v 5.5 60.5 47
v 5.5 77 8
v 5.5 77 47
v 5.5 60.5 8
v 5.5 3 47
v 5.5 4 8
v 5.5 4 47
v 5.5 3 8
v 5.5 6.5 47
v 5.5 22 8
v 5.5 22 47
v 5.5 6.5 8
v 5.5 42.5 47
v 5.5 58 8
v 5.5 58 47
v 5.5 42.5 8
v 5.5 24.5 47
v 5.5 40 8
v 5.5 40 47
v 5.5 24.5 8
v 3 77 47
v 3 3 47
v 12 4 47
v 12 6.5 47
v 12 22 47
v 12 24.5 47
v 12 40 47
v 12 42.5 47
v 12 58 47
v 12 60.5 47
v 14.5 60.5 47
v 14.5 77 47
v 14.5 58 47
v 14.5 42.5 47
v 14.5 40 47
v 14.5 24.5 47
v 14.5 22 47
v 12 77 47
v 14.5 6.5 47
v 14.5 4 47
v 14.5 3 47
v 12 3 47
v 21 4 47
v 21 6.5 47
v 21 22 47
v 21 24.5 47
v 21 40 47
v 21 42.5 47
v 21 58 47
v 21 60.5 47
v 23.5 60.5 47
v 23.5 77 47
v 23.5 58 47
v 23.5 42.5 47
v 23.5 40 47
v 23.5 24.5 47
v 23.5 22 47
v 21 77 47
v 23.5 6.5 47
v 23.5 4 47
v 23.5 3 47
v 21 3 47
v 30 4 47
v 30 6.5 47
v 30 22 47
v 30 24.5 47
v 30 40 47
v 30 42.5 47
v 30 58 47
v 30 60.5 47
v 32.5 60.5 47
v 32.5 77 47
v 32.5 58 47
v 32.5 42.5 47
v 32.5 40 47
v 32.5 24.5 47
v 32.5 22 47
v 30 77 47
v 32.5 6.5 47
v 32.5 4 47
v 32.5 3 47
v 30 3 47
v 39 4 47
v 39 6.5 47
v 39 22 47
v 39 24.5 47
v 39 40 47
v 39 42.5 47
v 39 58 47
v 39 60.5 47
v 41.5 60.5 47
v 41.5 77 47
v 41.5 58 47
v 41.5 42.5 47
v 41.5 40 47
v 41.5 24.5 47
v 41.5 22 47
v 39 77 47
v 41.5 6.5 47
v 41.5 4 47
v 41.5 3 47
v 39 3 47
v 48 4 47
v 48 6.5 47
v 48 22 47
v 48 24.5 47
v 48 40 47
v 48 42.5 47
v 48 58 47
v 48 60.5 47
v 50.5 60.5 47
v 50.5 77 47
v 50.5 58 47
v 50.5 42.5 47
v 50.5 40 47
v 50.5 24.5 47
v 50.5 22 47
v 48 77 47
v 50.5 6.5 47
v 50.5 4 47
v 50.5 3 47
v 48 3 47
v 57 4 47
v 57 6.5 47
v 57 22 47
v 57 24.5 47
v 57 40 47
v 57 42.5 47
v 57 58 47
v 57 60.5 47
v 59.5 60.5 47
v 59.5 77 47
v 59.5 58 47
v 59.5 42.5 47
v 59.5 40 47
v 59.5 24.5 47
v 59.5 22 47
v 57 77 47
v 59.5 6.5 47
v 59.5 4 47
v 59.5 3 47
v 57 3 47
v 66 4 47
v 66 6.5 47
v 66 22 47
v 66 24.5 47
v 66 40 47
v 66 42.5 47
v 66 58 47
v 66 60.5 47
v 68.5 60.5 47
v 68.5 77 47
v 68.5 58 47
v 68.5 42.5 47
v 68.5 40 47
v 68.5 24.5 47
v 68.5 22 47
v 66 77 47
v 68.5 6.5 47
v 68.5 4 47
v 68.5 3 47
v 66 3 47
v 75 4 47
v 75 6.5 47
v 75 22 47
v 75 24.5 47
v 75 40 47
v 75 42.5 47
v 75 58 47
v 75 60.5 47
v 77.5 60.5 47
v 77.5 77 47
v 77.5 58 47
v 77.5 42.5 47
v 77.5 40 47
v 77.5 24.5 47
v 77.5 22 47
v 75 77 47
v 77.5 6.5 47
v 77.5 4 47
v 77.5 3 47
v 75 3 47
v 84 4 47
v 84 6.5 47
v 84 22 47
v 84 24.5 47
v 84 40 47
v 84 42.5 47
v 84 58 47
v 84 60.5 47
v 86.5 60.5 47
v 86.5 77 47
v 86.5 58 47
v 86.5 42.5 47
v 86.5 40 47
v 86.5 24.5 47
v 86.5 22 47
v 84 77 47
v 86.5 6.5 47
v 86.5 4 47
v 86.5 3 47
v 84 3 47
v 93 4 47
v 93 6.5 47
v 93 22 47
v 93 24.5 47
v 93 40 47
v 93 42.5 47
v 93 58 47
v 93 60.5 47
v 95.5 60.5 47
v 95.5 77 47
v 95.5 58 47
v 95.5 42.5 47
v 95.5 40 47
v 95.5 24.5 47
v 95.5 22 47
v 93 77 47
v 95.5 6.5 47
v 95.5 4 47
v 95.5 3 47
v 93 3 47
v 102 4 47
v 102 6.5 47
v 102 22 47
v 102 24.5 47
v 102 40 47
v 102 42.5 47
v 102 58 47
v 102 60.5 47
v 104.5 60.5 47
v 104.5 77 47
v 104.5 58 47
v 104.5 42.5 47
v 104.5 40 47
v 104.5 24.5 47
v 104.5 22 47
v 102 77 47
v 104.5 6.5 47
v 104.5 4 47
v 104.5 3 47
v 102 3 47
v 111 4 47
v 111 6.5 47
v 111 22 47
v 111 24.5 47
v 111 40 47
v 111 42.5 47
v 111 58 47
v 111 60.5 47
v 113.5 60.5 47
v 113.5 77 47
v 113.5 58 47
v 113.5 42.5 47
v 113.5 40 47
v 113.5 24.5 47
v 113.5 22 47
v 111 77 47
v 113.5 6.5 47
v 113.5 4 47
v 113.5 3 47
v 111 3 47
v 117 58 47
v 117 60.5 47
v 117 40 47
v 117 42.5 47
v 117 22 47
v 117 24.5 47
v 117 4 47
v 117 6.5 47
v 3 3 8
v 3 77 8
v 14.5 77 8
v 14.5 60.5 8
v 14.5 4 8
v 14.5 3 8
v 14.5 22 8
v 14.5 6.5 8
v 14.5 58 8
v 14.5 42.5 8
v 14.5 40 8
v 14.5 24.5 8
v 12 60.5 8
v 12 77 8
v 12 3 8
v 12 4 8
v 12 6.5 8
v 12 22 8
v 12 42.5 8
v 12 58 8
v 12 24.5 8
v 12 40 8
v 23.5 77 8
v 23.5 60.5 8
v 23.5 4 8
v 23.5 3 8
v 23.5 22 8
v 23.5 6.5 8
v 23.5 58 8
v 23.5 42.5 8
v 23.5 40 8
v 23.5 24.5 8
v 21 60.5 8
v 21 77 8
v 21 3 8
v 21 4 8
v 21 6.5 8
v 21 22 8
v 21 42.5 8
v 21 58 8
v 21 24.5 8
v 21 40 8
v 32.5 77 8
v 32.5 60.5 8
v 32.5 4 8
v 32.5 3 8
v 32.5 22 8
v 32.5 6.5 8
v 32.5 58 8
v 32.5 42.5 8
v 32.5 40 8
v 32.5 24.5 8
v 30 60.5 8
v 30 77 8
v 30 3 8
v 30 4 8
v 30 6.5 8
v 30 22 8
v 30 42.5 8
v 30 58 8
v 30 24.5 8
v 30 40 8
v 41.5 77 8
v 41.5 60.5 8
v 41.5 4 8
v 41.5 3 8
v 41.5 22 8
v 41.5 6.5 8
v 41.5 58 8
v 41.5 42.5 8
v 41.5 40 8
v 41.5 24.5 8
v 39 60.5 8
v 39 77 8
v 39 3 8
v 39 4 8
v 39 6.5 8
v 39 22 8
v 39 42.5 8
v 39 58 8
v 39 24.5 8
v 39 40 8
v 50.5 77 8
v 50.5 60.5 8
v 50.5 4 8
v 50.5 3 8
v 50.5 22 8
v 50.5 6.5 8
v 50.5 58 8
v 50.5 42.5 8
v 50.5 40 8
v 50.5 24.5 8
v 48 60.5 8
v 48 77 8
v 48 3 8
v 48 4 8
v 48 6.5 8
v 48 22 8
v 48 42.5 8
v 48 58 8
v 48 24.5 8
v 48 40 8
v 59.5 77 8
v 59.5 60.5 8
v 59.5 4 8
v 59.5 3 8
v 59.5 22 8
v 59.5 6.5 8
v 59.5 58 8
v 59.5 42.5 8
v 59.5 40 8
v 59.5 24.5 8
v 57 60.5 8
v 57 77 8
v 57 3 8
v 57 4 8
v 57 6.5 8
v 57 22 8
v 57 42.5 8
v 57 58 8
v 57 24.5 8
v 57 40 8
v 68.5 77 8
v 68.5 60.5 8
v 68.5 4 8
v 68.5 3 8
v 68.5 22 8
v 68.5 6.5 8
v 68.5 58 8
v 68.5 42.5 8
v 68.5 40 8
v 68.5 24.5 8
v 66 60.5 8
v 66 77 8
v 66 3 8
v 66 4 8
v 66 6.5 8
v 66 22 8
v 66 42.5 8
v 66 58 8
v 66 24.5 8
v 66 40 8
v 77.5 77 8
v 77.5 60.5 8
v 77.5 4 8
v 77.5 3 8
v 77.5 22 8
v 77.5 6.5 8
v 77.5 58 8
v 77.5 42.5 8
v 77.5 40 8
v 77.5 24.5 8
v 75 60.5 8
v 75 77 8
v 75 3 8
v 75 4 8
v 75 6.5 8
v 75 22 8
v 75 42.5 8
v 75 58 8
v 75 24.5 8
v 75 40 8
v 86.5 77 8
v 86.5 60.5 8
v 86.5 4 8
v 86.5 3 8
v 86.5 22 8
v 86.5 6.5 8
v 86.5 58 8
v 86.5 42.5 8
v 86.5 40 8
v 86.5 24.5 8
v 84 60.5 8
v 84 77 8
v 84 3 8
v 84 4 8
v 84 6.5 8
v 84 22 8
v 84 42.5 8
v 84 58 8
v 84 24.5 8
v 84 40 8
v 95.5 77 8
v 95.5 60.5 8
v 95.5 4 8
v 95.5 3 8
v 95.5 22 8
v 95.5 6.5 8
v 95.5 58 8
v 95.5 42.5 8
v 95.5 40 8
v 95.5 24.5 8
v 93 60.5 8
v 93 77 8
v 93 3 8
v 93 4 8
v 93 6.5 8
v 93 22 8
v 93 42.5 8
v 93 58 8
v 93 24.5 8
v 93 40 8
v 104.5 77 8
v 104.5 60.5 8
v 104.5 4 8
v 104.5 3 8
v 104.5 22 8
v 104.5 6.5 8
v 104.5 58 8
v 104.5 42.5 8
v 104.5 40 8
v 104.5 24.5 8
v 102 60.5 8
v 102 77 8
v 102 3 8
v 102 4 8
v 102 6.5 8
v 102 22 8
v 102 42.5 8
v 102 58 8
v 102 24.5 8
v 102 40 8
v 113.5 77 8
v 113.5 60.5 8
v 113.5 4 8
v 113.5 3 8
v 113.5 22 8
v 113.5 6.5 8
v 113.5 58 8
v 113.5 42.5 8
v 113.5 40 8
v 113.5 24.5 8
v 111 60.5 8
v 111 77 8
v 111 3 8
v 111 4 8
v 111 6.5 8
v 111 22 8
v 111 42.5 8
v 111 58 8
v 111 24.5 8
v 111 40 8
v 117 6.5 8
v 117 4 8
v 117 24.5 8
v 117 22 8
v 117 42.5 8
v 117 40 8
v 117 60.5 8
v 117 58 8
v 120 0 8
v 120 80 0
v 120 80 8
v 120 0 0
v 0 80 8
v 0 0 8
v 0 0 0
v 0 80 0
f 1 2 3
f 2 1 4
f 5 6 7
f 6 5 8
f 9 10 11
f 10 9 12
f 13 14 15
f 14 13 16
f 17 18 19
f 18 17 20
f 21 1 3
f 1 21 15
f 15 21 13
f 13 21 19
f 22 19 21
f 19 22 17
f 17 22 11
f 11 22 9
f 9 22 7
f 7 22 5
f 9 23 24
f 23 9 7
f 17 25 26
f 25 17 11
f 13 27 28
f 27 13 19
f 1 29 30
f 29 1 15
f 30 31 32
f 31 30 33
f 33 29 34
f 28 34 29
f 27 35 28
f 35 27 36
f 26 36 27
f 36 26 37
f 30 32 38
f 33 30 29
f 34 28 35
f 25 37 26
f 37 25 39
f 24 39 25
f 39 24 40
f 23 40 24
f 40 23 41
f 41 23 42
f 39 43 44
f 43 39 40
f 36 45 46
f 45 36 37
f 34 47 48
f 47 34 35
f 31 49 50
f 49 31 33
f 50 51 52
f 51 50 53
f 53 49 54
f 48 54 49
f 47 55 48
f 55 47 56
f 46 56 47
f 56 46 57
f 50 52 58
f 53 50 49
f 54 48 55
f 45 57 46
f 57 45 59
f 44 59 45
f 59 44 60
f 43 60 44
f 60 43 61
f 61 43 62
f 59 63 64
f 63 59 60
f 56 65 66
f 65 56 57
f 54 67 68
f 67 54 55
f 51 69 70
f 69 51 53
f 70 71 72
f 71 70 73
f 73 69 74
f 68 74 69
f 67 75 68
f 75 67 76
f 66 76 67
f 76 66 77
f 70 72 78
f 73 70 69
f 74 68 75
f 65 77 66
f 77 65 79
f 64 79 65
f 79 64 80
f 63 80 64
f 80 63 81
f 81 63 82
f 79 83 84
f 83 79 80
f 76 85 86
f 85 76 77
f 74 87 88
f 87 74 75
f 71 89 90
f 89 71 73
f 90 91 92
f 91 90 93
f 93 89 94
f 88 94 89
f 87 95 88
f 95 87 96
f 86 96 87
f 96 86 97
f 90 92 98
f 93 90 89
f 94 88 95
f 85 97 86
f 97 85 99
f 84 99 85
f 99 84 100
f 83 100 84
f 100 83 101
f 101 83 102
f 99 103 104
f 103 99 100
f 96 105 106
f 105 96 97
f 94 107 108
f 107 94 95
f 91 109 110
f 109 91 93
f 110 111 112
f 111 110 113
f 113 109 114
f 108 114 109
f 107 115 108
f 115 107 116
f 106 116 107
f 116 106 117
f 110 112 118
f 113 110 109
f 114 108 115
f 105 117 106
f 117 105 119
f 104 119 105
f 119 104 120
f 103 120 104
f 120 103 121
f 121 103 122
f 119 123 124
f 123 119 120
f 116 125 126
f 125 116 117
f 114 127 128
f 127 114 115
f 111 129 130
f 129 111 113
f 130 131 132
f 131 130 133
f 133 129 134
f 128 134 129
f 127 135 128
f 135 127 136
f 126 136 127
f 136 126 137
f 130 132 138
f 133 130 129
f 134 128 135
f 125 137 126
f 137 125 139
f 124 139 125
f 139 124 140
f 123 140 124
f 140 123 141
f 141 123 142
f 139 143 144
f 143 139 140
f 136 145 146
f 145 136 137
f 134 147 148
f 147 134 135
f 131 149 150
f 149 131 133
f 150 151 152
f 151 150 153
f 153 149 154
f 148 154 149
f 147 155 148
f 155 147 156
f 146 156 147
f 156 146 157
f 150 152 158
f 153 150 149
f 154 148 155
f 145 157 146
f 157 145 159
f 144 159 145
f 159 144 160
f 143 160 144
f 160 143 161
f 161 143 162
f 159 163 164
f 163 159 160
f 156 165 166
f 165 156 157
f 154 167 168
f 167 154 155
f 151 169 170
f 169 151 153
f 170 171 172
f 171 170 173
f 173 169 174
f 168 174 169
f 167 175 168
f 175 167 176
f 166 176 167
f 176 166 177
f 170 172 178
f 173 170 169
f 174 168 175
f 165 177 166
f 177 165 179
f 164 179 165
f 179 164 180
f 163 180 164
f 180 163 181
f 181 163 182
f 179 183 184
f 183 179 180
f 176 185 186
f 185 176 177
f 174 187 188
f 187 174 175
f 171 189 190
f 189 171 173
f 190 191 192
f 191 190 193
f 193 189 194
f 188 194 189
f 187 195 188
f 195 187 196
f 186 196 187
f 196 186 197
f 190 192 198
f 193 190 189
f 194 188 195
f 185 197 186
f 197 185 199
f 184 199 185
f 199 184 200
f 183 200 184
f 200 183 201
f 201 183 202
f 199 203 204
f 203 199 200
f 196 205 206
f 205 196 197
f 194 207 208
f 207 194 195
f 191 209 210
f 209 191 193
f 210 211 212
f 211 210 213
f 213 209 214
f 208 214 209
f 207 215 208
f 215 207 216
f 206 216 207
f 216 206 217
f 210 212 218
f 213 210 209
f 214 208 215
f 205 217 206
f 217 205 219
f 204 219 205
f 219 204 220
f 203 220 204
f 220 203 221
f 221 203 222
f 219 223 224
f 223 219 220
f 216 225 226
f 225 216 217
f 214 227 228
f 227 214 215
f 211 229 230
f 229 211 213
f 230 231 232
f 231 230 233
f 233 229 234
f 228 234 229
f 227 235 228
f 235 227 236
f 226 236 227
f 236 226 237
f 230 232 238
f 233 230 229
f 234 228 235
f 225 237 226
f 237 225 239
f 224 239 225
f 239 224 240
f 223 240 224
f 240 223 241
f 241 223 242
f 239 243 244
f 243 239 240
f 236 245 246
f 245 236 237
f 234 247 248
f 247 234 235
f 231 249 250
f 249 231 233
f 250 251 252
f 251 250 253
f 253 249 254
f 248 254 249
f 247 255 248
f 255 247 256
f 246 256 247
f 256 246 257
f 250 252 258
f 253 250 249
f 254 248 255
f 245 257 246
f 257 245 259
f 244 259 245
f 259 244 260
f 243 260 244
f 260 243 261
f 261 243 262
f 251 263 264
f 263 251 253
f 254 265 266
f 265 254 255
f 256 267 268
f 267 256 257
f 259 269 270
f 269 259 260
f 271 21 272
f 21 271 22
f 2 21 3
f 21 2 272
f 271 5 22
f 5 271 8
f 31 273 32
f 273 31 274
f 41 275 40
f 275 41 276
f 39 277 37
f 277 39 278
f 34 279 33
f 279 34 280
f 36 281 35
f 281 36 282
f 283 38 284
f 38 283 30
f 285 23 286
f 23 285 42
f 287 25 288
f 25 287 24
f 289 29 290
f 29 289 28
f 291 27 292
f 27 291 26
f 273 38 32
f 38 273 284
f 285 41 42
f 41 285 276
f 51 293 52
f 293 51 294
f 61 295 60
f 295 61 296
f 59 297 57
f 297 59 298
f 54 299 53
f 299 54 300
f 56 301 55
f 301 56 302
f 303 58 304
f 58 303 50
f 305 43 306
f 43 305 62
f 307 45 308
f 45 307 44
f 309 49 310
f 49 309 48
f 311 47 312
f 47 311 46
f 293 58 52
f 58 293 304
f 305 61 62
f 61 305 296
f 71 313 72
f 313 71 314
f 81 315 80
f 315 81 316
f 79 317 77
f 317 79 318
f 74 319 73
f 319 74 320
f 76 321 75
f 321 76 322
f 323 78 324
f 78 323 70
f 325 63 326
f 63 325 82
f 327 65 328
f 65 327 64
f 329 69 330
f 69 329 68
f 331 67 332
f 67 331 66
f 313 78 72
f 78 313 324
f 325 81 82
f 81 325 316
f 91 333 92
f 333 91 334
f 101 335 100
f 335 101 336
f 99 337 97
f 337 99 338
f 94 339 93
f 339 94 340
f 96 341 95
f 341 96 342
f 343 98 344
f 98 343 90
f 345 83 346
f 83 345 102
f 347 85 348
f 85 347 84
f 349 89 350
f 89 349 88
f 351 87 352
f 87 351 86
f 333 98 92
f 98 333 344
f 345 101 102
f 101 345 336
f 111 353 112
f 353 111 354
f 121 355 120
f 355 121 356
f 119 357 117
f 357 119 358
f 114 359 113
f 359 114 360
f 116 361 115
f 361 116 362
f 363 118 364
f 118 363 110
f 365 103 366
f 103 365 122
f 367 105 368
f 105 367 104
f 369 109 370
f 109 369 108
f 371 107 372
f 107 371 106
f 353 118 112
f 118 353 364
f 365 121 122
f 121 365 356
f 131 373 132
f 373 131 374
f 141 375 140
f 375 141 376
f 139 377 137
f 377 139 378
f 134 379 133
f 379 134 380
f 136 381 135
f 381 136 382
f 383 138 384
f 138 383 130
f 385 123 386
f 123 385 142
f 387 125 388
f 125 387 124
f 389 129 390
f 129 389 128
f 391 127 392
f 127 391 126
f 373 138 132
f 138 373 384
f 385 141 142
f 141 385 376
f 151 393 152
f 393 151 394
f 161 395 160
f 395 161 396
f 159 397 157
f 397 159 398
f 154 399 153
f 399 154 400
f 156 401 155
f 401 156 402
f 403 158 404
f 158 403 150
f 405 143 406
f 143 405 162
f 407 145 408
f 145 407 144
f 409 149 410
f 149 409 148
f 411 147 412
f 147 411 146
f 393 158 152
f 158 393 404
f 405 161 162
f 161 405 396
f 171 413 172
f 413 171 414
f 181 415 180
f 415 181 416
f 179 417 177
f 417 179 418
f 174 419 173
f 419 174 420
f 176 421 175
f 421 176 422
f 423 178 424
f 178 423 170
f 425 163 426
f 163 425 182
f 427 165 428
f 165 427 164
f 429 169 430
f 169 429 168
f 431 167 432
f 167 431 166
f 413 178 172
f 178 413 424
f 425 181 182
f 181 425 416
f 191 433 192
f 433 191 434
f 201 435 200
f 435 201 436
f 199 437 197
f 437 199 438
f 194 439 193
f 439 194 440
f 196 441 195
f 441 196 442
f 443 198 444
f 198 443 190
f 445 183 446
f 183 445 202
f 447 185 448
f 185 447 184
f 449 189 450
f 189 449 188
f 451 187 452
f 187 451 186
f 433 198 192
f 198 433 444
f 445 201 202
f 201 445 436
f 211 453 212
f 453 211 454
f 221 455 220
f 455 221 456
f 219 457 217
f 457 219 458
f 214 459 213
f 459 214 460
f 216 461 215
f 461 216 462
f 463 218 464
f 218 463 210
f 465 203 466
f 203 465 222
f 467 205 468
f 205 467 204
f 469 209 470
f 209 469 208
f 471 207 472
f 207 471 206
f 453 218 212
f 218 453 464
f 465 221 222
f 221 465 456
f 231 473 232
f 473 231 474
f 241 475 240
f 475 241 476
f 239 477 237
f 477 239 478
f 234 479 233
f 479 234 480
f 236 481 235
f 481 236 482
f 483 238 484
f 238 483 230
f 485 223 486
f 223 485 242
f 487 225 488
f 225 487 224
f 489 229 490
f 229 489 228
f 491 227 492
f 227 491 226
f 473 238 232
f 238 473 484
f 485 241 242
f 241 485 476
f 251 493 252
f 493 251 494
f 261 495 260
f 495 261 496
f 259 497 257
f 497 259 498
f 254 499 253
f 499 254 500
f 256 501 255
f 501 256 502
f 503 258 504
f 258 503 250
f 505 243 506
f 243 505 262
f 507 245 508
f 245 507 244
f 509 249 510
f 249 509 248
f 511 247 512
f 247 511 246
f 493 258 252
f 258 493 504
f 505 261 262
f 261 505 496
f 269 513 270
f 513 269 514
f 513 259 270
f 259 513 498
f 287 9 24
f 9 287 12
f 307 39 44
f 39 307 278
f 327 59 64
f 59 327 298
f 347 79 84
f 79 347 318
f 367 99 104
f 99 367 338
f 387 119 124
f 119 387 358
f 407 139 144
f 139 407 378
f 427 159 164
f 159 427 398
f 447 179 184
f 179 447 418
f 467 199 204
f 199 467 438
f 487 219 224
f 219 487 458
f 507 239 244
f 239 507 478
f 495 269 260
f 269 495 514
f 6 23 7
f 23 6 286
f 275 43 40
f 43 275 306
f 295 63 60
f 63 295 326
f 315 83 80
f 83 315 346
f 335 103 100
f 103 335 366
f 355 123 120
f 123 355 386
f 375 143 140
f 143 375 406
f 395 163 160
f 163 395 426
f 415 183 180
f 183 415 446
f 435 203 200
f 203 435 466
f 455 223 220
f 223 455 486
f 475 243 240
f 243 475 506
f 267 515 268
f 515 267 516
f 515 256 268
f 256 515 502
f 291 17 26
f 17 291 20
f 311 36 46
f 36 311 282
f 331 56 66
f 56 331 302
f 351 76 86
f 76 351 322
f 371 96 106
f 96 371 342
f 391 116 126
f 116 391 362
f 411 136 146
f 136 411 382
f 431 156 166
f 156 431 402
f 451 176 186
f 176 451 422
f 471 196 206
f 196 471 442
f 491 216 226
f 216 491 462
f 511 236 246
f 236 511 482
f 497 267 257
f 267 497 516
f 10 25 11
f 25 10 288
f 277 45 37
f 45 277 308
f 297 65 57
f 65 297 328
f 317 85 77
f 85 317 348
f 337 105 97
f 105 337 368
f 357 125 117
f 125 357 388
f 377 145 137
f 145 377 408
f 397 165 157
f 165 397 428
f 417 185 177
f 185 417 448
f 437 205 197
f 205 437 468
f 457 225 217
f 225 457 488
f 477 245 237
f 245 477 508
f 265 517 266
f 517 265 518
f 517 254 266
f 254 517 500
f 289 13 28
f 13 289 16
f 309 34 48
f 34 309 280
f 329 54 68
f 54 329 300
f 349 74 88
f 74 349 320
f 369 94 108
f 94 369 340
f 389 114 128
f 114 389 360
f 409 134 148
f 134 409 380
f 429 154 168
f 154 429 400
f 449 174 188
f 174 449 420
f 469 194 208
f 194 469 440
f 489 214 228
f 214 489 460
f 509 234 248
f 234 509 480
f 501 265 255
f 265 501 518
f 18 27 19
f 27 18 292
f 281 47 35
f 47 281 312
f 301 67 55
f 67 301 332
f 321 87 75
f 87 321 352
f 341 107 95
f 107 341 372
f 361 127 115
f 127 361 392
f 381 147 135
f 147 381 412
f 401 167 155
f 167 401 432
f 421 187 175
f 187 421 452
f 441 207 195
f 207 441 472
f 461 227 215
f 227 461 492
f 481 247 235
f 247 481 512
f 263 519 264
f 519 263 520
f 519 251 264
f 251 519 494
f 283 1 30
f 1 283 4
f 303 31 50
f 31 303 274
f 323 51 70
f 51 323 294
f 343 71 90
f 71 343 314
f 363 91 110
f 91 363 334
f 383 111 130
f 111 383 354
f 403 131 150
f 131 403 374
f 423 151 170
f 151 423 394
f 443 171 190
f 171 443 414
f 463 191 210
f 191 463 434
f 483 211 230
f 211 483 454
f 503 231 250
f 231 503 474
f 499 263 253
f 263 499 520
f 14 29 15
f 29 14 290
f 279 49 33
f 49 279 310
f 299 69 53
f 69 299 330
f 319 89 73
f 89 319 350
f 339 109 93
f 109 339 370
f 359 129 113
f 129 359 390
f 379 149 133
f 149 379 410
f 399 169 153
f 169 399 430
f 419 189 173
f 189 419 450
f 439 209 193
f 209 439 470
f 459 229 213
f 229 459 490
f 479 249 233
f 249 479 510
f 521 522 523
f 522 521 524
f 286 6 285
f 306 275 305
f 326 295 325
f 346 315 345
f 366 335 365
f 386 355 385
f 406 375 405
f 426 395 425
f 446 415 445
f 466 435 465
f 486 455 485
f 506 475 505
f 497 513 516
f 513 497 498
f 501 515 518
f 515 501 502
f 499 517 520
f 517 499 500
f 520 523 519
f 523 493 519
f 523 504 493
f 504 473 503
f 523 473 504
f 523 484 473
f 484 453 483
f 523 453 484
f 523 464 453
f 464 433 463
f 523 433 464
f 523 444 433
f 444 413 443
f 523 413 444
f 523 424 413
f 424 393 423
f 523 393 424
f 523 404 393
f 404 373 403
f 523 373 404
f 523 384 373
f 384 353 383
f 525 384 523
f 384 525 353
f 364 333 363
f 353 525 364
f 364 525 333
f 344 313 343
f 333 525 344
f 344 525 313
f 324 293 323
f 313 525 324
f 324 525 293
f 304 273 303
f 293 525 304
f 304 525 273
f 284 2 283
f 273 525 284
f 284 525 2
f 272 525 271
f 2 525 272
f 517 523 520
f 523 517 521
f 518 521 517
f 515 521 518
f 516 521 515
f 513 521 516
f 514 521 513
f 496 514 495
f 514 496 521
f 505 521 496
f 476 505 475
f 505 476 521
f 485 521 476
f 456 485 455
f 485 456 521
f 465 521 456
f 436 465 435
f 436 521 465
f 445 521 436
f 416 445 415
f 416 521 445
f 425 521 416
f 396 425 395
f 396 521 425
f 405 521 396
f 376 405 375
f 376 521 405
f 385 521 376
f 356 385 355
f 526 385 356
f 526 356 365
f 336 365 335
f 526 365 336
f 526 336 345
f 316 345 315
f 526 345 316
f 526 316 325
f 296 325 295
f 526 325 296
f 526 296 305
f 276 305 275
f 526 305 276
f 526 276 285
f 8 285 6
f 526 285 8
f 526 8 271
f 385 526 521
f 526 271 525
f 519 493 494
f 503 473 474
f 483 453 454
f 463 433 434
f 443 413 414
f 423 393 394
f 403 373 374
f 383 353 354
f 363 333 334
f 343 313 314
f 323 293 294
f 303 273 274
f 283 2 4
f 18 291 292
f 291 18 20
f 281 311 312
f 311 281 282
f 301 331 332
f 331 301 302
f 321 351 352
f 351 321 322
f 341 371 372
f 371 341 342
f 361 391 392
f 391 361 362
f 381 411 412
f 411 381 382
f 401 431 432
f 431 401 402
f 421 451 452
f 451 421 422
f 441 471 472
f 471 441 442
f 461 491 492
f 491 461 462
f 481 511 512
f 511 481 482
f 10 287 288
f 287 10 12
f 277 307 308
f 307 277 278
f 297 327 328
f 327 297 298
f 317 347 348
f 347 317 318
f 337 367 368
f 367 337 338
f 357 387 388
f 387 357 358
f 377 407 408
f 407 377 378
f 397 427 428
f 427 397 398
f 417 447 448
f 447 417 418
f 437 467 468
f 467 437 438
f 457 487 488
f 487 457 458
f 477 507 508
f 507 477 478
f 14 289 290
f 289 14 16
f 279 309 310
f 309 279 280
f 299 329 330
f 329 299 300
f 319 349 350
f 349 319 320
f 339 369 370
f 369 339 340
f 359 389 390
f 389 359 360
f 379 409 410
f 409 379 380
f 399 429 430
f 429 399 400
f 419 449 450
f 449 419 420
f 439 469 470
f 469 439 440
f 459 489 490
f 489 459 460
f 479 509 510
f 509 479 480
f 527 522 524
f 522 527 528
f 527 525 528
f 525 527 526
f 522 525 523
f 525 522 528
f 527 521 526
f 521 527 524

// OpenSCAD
$fn = 32;

// ----------------------------------------------------------------------
// Heatsink: cross fin block
// ----------------------------------------------------------------------

// --- parameters (mm) ---
base_l = 120;             // base length, X
base_w = 80;              // base width, Y
base_t = 8;               // base plate thickness
fin_h = 40;               // fin height above the base
fin_t = 2.5;              // fin thickness
edge = 3;                 // margin from the base ends
pitch = 9;                // fin pitch
rib_pitch = 18;           // cross rib pitch

n_fins = floor((base_l - 2 * edge - fin_t) / pitch) + 1;  // fin count
total_h = base_t + fin_h - 1;  // overall height
n_ribs = floor((base_w - 2 * edge) / rib_pitch);  // rib count

union() {
  cube([base_l, base_w, base_t]);
  for (i = [0 : n_fins - 1])
    translate([edge + i * pitch, edge, base_t - 1])
      cube([fin_t, base_w - 2 * edge, fin_h]);
  for (i = [0 : n_ribs - 1])
    translate([edge, edge + 1 + i * rib_pitch, base_t - 1])
      cube([base_l - 2 * edge, fin_t, fin_h]);
}
